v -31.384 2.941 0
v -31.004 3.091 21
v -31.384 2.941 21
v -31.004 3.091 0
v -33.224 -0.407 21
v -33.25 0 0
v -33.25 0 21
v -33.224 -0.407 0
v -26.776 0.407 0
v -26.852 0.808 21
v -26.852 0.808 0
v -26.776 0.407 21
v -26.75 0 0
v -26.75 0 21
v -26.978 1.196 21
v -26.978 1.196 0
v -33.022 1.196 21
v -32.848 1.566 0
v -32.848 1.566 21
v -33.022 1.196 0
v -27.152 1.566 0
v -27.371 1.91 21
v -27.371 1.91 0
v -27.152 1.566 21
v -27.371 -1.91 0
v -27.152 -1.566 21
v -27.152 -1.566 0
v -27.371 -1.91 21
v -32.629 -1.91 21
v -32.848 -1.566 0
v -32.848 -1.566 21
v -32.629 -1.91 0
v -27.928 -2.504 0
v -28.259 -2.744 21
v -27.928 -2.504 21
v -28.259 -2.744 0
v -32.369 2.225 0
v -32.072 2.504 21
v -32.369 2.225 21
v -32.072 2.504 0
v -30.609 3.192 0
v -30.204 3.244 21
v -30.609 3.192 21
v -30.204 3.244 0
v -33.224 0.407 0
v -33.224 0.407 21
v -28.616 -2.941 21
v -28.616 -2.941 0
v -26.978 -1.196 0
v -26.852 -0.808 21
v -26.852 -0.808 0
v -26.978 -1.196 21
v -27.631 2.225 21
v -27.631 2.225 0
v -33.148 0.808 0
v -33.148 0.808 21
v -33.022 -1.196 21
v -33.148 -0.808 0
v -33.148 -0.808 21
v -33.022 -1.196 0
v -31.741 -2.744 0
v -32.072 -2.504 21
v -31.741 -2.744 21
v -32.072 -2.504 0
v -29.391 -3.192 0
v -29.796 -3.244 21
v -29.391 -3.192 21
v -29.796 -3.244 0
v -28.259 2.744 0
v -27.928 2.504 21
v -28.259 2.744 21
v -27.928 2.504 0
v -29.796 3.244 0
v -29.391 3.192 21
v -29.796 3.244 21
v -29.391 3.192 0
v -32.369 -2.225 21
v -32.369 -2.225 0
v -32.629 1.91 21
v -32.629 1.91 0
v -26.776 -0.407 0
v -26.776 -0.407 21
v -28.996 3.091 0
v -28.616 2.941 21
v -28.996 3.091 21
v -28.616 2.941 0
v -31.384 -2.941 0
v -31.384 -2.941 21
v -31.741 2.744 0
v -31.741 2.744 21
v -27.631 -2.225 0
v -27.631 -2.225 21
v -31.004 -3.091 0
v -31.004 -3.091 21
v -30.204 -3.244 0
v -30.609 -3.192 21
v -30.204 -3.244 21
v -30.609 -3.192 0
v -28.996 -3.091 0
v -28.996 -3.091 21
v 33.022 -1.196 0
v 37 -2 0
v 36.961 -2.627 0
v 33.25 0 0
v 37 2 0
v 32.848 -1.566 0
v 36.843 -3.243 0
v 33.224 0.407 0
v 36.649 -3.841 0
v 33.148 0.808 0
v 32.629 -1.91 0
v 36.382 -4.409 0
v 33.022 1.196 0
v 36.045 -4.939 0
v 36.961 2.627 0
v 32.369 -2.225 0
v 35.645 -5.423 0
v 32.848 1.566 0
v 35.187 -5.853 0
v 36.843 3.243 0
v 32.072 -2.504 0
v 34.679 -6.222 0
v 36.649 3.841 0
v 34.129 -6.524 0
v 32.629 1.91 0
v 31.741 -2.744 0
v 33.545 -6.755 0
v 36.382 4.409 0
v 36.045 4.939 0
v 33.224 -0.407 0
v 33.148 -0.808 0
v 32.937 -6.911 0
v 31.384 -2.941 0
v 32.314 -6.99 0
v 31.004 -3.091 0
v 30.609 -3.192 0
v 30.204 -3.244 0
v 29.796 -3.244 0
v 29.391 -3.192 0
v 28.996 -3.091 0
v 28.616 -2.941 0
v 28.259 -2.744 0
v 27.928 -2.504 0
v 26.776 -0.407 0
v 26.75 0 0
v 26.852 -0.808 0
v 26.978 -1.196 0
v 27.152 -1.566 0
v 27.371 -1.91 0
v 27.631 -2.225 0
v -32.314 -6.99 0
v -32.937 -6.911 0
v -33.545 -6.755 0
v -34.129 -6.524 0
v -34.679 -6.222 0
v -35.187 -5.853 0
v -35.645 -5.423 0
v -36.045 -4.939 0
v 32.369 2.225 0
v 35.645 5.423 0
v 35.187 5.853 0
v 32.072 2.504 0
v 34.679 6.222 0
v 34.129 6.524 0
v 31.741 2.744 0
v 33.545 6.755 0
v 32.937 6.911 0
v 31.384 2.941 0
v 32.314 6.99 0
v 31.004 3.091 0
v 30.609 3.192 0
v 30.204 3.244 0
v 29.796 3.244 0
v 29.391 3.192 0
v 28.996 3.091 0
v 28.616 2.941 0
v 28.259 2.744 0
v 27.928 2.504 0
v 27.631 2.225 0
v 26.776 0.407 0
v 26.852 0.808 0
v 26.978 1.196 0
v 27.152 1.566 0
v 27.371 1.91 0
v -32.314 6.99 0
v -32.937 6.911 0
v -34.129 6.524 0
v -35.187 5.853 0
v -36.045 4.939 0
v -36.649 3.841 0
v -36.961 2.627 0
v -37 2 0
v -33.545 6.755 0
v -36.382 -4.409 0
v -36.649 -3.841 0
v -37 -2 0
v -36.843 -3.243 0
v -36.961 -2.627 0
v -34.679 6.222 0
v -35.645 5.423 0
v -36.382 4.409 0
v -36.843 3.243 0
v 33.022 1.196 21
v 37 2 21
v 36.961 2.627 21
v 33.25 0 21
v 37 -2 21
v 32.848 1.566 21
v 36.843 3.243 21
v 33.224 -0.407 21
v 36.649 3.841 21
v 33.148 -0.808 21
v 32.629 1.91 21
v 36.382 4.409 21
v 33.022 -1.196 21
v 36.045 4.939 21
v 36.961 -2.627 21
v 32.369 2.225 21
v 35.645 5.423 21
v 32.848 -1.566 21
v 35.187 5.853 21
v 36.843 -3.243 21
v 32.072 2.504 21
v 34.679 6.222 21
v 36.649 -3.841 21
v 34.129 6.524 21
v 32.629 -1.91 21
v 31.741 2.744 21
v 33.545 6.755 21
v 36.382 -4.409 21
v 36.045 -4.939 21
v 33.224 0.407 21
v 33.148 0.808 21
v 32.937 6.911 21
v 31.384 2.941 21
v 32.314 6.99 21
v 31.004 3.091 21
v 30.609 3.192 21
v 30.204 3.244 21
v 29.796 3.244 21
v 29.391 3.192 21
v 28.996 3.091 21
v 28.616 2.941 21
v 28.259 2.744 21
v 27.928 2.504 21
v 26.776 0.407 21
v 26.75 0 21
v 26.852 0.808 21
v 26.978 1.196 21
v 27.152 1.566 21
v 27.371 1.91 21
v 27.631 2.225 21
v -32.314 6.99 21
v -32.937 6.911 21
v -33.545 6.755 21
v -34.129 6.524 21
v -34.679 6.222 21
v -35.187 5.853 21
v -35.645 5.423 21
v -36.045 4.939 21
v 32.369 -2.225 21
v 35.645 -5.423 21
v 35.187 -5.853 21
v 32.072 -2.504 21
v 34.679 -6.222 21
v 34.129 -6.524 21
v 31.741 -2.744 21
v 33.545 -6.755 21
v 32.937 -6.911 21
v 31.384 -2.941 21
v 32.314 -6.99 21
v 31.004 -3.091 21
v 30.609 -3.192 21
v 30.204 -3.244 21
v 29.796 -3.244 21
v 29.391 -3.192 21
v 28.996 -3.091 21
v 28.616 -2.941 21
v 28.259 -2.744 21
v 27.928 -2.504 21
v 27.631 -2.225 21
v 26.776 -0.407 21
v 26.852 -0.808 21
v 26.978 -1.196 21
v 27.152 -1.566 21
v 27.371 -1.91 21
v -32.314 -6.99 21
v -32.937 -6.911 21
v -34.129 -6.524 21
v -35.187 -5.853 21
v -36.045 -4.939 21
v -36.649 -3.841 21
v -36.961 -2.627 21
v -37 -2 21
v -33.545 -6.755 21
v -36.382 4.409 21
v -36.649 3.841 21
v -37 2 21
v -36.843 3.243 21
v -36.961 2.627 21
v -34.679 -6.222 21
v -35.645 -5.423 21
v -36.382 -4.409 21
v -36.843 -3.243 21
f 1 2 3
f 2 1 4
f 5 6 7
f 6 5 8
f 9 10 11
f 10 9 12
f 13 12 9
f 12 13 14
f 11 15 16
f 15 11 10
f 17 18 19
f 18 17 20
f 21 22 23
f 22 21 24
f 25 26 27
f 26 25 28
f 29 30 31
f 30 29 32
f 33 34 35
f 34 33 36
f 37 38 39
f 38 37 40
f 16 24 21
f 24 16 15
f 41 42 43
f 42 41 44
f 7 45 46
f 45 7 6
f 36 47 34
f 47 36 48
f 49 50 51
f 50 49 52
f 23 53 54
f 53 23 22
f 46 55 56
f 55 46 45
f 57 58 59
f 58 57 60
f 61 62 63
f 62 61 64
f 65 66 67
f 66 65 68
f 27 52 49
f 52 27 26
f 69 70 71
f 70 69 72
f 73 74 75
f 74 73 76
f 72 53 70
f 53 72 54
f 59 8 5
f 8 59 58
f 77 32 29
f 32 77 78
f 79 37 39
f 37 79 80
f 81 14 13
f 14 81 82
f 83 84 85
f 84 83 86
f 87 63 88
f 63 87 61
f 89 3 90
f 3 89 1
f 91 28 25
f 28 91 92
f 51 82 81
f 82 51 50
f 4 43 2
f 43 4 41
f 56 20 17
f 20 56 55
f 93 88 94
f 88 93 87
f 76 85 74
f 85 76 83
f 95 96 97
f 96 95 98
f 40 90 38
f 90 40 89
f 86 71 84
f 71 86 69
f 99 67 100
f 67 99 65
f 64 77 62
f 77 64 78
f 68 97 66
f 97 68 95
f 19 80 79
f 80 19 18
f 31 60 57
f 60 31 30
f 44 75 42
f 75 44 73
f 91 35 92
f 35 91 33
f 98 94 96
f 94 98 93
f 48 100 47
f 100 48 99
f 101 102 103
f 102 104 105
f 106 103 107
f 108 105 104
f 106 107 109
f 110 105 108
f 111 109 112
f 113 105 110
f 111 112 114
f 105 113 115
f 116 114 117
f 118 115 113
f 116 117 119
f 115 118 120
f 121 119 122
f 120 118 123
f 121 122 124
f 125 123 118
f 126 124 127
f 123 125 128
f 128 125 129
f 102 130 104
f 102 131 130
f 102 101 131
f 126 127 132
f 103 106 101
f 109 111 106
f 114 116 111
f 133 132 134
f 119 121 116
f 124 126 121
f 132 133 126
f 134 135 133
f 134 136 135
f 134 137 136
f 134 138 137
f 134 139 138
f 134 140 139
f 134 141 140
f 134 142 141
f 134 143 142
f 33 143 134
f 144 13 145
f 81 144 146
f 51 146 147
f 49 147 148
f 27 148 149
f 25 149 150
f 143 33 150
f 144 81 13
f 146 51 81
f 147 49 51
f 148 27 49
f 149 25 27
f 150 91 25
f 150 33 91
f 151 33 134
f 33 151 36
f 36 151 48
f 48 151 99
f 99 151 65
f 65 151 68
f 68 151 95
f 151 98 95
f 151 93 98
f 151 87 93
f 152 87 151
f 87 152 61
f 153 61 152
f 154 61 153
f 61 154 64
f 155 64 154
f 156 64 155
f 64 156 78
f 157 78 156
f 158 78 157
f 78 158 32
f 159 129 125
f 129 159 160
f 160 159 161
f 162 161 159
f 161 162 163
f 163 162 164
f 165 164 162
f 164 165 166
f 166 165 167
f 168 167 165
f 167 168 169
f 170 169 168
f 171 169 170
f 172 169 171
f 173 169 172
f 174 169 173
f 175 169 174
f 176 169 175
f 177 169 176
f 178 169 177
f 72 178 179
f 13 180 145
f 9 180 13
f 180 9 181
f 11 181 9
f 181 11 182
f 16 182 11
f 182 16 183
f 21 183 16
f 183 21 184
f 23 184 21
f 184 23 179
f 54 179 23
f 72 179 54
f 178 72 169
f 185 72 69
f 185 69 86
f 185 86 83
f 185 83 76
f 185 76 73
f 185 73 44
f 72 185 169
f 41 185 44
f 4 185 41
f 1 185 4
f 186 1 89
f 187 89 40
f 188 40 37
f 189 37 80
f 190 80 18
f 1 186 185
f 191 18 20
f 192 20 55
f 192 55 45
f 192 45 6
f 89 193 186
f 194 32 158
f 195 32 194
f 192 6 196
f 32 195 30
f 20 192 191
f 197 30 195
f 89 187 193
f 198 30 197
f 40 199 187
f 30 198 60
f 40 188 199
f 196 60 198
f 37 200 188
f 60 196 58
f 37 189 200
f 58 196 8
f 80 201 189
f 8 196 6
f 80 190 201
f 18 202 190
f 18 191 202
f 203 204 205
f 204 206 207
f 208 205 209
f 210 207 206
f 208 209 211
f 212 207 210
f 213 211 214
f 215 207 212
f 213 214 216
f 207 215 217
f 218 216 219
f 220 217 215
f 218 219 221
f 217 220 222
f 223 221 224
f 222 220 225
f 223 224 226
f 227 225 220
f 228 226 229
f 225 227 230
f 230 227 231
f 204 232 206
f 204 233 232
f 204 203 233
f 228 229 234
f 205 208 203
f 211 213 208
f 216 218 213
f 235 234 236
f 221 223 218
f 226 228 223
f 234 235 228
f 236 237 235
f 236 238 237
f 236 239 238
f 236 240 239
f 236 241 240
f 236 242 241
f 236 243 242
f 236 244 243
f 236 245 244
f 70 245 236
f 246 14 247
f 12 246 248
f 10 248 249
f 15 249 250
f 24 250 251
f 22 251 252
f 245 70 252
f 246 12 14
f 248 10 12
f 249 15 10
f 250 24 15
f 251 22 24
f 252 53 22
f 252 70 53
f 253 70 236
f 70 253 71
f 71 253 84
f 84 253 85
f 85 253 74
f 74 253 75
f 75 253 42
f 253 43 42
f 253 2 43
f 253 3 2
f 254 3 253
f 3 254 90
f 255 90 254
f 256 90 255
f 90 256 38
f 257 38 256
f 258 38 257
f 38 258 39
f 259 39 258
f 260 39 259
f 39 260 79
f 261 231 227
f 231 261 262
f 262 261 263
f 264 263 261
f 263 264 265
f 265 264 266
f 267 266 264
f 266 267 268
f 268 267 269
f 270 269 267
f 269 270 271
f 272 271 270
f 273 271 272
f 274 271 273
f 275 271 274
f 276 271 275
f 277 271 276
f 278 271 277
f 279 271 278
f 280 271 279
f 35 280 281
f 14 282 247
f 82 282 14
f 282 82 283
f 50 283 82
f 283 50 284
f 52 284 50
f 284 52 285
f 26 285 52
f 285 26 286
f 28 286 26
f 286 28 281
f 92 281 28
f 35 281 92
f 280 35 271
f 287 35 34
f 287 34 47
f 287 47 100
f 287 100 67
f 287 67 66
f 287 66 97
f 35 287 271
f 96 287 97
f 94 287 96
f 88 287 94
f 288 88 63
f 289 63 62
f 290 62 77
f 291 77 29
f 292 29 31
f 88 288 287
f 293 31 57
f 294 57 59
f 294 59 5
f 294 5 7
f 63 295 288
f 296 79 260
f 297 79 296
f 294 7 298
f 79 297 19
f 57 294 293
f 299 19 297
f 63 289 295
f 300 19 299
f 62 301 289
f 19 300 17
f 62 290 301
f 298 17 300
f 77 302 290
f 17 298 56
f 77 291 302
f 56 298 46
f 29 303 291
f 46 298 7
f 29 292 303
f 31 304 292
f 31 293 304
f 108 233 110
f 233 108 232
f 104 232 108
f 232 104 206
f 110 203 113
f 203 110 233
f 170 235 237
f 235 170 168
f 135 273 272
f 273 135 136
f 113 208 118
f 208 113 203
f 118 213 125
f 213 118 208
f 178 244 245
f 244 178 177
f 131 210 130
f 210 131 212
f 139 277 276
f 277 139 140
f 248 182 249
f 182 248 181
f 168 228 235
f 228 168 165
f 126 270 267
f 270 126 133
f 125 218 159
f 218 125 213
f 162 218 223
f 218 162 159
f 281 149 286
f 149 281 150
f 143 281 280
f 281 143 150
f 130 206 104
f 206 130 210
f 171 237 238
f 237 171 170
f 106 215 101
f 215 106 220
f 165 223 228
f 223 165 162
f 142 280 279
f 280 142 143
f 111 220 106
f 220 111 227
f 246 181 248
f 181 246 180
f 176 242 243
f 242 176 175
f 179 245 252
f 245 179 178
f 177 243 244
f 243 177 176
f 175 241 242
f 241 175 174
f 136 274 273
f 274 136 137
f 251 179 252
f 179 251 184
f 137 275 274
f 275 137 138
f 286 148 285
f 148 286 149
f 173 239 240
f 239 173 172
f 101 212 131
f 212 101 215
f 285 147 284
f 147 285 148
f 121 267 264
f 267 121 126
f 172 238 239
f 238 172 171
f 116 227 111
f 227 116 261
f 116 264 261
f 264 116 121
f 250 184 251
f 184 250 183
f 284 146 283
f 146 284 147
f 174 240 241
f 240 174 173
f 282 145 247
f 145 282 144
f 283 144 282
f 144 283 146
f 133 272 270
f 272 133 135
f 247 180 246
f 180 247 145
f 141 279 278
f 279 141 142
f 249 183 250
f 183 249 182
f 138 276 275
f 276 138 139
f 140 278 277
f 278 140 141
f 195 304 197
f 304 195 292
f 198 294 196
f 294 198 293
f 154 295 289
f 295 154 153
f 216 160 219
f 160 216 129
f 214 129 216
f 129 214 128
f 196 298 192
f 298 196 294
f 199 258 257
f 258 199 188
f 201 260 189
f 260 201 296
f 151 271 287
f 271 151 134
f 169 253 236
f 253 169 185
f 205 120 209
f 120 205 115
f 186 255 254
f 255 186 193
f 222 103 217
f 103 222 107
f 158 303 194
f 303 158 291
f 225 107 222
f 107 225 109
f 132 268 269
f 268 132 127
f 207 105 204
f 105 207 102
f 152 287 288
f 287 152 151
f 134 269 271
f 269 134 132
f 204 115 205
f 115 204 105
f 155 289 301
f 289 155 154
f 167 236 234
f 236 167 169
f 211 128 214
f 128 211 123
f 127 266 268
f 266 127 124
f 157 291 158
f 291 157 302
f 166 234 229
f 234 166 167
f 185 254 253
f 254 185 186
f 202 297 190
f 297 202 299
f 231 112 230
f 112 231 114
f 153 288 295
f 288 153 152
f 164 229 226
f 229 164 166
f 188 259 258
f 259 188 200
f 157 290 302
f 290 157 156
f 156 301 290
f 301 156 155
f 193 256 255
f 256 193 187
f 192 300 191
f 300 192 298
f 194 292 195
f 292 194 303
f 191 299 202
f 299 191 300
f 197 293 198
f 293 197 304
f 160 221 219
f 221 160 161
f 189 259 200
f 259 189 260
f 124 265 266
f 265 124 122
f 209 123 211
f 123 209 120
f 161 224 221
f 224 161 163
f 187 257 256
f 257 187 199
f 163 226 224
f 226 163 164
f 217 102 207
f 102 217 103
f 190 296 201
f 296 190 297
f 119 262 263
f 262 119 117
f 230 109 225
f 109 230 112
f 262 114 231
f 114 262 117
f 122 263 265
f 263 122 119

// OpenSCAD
$fn = 50;


difference() {
	union() {
		hull() {
			translate(v = [-32.0000000000, 2.0000000000, 0]) {
				cylinder(h = 21, r = 5);
			}
			translate(v = [32.0000000000, 2.0000000000, 0]) {
				cylinder(h = 21, r = 5);
			}
			translate(v = [-32.0000000000, -2.0000000000, 0]) {
				cylinder(h = 21, r = 5);
			}
			translate(v = [32.0000000000, -2.0000000000, 0]) {
				cylinder(h = 21, r = 5);
			}
		}
	}
	union() {
		translate(v = [-30.0000000000, 0.0000000000, 0]) {
			cylinder(h = 21, r = 3.2500000000);
		}
		translate(v = [30.0000000000, 0.0000000000, 0]) {
			cylinder(h = 21, r = 3.2500000000);
		}
		translate(v = [-30.0000000000, 0.0000000000, 0]) {
			cylinder(h = 21, r = 1.8000000000);
		}
		translate(v = [30.0000000000, 0.0000000000, 0]) {
			cylinder(h = 21, r = 1.8000000000);
		}
		translate(v = [-30.0000000000, 0.0000000000, 0]) {
			cylinder(h = 21, r = 1.8000000000);
		}
		translate(v = [30.0000000000, 0.0000000000, 0]) {
			cylinder(h = 21, r = 1.8000000000);
		}
		translate(v = [-30.0000000000, 0.0000000000, 0]) {
			cylinder(h = 21, r = 1.8000000000);
		}
		translate(v = [30.0000000000, 0.0000000000, 0]) {
			cylinder(h = 21, r = 1.8000000000);
		}
	}
}
